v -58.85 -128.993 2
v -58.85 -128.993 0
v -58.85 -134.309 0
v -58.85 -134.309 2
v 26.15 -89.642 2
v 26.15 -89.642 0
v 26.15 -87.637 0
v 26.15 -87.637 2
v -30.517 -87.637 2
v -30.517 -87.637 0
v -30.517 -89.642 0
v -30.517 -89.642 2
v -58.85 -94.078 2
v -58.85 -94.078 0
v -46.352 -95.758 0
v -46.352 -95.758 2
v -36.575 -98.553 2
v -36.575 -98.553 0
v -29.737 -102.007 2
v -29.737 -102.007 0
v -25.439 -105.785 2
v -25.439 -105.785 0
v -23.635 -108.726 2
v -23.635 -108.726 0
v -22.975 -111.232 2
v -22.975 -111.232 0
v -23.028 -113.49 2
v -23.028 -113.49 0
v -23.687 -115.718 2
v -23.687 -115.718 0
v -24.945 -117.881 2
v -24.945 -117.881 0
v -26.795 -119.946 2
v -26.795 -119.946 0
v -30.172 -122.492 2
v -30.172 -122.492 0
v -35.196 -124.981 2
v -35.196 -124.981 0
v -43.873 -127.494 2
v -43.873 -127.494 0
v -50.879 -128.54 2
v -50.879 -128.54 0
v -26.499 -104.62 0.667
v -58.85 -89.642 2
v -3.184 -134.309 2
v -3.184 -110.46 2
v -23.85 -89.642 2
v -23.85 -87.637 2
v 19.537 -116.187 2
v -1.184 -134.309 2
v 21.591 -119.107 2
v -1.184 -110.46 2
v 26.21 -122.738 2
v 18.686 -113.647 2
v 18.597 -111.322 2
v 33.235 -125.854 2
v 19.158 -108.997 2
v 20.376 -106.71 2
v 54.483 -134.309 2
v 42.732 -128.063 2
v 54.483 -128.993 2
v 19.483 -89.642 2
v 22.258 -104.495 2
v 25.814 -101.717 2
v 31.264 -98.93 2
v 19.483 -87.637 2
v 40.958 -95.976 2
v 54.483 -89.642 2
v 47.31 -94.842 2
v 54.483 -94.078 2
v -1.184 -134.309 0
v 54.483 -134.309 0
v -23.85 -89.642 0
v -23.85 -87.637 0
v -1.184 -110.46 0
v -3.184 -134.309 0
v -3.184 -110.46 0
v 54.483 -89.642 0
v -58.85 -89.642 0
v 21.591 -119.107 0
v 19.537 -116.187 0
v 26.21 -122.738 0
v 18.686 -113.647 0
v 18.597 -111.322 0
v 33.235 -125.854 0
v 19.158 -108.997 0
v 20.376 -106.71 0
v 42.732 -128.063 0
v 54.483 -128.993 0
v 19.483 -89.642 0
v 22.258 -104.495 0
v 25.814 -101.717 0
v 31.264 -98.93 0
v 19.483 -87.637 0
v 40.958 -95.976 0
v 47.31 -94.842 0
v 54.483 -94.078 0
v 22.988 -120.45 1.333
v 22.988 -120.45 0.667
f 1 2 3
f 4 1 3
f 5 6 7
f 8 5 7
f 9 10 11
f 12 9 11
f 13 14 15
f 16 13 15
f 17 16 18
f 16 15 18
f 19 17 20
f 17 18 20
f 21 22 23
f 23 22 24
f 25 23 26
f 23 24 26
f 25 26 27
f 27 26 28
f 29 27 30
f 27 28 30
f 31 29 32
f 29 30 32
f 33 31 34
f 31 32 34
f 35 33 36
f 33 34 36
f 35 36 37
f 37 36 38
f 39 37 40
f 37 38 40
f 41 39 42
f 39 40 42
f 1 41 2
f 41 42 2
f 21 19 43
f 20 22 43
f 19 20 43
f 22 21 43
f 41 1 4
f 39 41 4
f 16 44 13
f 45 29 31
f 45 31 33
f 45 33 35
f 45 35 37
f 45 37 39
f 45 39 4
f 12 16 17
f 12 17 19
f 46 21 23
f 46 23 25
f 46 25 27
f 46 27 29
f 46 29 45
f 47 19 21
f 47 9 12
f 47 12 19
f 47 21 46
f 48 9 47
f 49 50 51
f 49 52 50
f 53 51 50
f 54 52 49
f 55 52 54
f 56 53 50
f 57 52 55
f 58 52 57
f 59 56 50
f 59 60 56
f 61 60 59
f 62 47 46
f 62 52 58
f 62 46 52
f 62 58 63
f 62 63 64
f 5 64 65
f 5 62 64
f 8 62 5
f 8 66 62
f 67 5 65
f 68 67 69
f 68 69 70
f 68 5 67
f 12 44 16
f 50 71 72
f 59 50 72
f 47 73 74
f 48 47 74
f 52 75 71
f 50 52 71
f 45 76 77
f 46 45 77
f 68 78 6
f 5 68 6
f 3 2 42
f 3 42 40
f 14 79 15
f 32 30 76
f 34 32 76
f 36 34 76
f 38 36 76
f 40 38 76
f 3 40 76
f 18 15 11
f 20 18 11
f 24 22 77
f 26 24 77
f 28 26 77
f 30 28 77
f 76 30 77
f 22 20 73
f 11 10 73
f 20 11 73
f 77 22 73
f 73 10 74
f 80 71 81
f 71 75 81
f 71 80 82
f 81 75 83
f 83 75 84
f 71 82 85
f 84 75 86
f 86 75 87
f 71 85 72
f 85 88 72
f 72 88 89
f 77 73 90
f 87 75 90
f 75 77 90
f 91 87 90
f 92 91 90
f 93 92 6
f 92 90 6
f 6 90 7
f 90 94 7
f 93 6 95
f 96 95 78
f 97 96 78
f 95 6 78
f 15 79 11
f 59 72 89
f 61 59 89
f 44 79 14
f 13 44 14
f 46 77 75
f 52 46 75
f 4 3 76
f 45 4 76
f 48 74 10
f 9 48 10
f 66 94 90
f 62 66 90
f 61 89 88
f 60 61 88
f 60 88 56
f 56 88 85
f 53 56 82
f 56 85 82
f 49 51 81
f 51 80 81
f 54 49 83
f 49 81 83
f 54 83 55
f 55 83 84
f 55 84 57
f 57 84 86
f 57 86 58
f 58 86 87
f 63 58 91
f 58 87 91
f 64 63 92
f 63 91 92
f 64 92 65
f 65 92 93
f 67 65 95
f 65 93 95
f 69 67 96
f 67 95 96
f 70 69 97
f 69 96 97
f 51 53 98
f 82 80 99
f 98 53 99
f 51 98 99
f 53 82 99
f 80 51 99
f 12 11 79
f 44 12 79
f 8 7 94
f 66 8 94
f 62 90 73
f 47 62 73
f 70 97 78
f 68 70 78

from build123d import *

# Parameters (mm, degrees)
RESSALTO_EXTRUS_O1_DEPTH = 2


with BuildPart() as part:
    # Model → Ressalto-extrusão1 (new body)
    with BuildSketch(Plane.XY):
        with BuildLine():
            Line((-58.8502, -89.6424), (-58.8502, -94.0776))
            add(Edge.make_bspline(
                [(-58.8502, -94.0776), (-9.0376, -97.7844), (-12.8956, -128.2849), (-58.8502, -128.9929)],
                knots=[0.047619048, 0.047619048, 0.047619048, 0.047619048, 0.095238095, 0.095238095, 0.095238095, 0.095238095], degree=3))
            Line((-58.8502, -128.9929), (-58.8502, -134.309))
            Line((-58.8502, -134.309), (-3.1835, -134.309))
            Line((-3.1835, -134.309), (-3.1835, -110.4605))
            Line((-3.1835, -110.4605), (-1.1835, -110.4605))
            Line((-1.1835, -110.4605), (-1.1835, -134.309))
            Line((-1.1835, -134.309), (54.4831, -134.309))
            Line((54.4831, -134.309), (54.4831, -128.9929))
            add(Edge.make_bspline(
                [(54.4831, -128.9929), (8.5266, -128.2849), (4.6696, -97.7845), (54.4831, -94.0776)],
                knots=[0.428571429, 0.428571429, 0.428571429, 0.428571429, 0.476190476, 0.476190476, 0.476190476, 0.476190476], degree=3))
            Line((54.4831, -94.0776), (54.4831, -89.6424))
            Line((54.4831, -89.6424), (26.1498, -89.6424))
            Line((26.1498, -89.6424), (26.1498, -87.6372))
            Line((26.1498, -87.6372), (19.4831, -87.6372))
            Line((19.4831, -87.6372), (19.4831, -89.6424))
            Line((19.4831, -89.6424), (-23.8502, -89.6424))
            Line((-23.8502, -89.6424), (-23.8502, -87.6372))
            Line((-23.8502, -87.6372), (-30.5169, -87.6372))
            Line((-30.5169, -87.6372), (-30.5169, -89.6424))
            Line((-30.5169, -89.6424), (-58.8502, -89.6424))
        make_face()
    extrude(amount=RESSALTO_EXTRUS_O1_DEPTH)


solid = part.part
